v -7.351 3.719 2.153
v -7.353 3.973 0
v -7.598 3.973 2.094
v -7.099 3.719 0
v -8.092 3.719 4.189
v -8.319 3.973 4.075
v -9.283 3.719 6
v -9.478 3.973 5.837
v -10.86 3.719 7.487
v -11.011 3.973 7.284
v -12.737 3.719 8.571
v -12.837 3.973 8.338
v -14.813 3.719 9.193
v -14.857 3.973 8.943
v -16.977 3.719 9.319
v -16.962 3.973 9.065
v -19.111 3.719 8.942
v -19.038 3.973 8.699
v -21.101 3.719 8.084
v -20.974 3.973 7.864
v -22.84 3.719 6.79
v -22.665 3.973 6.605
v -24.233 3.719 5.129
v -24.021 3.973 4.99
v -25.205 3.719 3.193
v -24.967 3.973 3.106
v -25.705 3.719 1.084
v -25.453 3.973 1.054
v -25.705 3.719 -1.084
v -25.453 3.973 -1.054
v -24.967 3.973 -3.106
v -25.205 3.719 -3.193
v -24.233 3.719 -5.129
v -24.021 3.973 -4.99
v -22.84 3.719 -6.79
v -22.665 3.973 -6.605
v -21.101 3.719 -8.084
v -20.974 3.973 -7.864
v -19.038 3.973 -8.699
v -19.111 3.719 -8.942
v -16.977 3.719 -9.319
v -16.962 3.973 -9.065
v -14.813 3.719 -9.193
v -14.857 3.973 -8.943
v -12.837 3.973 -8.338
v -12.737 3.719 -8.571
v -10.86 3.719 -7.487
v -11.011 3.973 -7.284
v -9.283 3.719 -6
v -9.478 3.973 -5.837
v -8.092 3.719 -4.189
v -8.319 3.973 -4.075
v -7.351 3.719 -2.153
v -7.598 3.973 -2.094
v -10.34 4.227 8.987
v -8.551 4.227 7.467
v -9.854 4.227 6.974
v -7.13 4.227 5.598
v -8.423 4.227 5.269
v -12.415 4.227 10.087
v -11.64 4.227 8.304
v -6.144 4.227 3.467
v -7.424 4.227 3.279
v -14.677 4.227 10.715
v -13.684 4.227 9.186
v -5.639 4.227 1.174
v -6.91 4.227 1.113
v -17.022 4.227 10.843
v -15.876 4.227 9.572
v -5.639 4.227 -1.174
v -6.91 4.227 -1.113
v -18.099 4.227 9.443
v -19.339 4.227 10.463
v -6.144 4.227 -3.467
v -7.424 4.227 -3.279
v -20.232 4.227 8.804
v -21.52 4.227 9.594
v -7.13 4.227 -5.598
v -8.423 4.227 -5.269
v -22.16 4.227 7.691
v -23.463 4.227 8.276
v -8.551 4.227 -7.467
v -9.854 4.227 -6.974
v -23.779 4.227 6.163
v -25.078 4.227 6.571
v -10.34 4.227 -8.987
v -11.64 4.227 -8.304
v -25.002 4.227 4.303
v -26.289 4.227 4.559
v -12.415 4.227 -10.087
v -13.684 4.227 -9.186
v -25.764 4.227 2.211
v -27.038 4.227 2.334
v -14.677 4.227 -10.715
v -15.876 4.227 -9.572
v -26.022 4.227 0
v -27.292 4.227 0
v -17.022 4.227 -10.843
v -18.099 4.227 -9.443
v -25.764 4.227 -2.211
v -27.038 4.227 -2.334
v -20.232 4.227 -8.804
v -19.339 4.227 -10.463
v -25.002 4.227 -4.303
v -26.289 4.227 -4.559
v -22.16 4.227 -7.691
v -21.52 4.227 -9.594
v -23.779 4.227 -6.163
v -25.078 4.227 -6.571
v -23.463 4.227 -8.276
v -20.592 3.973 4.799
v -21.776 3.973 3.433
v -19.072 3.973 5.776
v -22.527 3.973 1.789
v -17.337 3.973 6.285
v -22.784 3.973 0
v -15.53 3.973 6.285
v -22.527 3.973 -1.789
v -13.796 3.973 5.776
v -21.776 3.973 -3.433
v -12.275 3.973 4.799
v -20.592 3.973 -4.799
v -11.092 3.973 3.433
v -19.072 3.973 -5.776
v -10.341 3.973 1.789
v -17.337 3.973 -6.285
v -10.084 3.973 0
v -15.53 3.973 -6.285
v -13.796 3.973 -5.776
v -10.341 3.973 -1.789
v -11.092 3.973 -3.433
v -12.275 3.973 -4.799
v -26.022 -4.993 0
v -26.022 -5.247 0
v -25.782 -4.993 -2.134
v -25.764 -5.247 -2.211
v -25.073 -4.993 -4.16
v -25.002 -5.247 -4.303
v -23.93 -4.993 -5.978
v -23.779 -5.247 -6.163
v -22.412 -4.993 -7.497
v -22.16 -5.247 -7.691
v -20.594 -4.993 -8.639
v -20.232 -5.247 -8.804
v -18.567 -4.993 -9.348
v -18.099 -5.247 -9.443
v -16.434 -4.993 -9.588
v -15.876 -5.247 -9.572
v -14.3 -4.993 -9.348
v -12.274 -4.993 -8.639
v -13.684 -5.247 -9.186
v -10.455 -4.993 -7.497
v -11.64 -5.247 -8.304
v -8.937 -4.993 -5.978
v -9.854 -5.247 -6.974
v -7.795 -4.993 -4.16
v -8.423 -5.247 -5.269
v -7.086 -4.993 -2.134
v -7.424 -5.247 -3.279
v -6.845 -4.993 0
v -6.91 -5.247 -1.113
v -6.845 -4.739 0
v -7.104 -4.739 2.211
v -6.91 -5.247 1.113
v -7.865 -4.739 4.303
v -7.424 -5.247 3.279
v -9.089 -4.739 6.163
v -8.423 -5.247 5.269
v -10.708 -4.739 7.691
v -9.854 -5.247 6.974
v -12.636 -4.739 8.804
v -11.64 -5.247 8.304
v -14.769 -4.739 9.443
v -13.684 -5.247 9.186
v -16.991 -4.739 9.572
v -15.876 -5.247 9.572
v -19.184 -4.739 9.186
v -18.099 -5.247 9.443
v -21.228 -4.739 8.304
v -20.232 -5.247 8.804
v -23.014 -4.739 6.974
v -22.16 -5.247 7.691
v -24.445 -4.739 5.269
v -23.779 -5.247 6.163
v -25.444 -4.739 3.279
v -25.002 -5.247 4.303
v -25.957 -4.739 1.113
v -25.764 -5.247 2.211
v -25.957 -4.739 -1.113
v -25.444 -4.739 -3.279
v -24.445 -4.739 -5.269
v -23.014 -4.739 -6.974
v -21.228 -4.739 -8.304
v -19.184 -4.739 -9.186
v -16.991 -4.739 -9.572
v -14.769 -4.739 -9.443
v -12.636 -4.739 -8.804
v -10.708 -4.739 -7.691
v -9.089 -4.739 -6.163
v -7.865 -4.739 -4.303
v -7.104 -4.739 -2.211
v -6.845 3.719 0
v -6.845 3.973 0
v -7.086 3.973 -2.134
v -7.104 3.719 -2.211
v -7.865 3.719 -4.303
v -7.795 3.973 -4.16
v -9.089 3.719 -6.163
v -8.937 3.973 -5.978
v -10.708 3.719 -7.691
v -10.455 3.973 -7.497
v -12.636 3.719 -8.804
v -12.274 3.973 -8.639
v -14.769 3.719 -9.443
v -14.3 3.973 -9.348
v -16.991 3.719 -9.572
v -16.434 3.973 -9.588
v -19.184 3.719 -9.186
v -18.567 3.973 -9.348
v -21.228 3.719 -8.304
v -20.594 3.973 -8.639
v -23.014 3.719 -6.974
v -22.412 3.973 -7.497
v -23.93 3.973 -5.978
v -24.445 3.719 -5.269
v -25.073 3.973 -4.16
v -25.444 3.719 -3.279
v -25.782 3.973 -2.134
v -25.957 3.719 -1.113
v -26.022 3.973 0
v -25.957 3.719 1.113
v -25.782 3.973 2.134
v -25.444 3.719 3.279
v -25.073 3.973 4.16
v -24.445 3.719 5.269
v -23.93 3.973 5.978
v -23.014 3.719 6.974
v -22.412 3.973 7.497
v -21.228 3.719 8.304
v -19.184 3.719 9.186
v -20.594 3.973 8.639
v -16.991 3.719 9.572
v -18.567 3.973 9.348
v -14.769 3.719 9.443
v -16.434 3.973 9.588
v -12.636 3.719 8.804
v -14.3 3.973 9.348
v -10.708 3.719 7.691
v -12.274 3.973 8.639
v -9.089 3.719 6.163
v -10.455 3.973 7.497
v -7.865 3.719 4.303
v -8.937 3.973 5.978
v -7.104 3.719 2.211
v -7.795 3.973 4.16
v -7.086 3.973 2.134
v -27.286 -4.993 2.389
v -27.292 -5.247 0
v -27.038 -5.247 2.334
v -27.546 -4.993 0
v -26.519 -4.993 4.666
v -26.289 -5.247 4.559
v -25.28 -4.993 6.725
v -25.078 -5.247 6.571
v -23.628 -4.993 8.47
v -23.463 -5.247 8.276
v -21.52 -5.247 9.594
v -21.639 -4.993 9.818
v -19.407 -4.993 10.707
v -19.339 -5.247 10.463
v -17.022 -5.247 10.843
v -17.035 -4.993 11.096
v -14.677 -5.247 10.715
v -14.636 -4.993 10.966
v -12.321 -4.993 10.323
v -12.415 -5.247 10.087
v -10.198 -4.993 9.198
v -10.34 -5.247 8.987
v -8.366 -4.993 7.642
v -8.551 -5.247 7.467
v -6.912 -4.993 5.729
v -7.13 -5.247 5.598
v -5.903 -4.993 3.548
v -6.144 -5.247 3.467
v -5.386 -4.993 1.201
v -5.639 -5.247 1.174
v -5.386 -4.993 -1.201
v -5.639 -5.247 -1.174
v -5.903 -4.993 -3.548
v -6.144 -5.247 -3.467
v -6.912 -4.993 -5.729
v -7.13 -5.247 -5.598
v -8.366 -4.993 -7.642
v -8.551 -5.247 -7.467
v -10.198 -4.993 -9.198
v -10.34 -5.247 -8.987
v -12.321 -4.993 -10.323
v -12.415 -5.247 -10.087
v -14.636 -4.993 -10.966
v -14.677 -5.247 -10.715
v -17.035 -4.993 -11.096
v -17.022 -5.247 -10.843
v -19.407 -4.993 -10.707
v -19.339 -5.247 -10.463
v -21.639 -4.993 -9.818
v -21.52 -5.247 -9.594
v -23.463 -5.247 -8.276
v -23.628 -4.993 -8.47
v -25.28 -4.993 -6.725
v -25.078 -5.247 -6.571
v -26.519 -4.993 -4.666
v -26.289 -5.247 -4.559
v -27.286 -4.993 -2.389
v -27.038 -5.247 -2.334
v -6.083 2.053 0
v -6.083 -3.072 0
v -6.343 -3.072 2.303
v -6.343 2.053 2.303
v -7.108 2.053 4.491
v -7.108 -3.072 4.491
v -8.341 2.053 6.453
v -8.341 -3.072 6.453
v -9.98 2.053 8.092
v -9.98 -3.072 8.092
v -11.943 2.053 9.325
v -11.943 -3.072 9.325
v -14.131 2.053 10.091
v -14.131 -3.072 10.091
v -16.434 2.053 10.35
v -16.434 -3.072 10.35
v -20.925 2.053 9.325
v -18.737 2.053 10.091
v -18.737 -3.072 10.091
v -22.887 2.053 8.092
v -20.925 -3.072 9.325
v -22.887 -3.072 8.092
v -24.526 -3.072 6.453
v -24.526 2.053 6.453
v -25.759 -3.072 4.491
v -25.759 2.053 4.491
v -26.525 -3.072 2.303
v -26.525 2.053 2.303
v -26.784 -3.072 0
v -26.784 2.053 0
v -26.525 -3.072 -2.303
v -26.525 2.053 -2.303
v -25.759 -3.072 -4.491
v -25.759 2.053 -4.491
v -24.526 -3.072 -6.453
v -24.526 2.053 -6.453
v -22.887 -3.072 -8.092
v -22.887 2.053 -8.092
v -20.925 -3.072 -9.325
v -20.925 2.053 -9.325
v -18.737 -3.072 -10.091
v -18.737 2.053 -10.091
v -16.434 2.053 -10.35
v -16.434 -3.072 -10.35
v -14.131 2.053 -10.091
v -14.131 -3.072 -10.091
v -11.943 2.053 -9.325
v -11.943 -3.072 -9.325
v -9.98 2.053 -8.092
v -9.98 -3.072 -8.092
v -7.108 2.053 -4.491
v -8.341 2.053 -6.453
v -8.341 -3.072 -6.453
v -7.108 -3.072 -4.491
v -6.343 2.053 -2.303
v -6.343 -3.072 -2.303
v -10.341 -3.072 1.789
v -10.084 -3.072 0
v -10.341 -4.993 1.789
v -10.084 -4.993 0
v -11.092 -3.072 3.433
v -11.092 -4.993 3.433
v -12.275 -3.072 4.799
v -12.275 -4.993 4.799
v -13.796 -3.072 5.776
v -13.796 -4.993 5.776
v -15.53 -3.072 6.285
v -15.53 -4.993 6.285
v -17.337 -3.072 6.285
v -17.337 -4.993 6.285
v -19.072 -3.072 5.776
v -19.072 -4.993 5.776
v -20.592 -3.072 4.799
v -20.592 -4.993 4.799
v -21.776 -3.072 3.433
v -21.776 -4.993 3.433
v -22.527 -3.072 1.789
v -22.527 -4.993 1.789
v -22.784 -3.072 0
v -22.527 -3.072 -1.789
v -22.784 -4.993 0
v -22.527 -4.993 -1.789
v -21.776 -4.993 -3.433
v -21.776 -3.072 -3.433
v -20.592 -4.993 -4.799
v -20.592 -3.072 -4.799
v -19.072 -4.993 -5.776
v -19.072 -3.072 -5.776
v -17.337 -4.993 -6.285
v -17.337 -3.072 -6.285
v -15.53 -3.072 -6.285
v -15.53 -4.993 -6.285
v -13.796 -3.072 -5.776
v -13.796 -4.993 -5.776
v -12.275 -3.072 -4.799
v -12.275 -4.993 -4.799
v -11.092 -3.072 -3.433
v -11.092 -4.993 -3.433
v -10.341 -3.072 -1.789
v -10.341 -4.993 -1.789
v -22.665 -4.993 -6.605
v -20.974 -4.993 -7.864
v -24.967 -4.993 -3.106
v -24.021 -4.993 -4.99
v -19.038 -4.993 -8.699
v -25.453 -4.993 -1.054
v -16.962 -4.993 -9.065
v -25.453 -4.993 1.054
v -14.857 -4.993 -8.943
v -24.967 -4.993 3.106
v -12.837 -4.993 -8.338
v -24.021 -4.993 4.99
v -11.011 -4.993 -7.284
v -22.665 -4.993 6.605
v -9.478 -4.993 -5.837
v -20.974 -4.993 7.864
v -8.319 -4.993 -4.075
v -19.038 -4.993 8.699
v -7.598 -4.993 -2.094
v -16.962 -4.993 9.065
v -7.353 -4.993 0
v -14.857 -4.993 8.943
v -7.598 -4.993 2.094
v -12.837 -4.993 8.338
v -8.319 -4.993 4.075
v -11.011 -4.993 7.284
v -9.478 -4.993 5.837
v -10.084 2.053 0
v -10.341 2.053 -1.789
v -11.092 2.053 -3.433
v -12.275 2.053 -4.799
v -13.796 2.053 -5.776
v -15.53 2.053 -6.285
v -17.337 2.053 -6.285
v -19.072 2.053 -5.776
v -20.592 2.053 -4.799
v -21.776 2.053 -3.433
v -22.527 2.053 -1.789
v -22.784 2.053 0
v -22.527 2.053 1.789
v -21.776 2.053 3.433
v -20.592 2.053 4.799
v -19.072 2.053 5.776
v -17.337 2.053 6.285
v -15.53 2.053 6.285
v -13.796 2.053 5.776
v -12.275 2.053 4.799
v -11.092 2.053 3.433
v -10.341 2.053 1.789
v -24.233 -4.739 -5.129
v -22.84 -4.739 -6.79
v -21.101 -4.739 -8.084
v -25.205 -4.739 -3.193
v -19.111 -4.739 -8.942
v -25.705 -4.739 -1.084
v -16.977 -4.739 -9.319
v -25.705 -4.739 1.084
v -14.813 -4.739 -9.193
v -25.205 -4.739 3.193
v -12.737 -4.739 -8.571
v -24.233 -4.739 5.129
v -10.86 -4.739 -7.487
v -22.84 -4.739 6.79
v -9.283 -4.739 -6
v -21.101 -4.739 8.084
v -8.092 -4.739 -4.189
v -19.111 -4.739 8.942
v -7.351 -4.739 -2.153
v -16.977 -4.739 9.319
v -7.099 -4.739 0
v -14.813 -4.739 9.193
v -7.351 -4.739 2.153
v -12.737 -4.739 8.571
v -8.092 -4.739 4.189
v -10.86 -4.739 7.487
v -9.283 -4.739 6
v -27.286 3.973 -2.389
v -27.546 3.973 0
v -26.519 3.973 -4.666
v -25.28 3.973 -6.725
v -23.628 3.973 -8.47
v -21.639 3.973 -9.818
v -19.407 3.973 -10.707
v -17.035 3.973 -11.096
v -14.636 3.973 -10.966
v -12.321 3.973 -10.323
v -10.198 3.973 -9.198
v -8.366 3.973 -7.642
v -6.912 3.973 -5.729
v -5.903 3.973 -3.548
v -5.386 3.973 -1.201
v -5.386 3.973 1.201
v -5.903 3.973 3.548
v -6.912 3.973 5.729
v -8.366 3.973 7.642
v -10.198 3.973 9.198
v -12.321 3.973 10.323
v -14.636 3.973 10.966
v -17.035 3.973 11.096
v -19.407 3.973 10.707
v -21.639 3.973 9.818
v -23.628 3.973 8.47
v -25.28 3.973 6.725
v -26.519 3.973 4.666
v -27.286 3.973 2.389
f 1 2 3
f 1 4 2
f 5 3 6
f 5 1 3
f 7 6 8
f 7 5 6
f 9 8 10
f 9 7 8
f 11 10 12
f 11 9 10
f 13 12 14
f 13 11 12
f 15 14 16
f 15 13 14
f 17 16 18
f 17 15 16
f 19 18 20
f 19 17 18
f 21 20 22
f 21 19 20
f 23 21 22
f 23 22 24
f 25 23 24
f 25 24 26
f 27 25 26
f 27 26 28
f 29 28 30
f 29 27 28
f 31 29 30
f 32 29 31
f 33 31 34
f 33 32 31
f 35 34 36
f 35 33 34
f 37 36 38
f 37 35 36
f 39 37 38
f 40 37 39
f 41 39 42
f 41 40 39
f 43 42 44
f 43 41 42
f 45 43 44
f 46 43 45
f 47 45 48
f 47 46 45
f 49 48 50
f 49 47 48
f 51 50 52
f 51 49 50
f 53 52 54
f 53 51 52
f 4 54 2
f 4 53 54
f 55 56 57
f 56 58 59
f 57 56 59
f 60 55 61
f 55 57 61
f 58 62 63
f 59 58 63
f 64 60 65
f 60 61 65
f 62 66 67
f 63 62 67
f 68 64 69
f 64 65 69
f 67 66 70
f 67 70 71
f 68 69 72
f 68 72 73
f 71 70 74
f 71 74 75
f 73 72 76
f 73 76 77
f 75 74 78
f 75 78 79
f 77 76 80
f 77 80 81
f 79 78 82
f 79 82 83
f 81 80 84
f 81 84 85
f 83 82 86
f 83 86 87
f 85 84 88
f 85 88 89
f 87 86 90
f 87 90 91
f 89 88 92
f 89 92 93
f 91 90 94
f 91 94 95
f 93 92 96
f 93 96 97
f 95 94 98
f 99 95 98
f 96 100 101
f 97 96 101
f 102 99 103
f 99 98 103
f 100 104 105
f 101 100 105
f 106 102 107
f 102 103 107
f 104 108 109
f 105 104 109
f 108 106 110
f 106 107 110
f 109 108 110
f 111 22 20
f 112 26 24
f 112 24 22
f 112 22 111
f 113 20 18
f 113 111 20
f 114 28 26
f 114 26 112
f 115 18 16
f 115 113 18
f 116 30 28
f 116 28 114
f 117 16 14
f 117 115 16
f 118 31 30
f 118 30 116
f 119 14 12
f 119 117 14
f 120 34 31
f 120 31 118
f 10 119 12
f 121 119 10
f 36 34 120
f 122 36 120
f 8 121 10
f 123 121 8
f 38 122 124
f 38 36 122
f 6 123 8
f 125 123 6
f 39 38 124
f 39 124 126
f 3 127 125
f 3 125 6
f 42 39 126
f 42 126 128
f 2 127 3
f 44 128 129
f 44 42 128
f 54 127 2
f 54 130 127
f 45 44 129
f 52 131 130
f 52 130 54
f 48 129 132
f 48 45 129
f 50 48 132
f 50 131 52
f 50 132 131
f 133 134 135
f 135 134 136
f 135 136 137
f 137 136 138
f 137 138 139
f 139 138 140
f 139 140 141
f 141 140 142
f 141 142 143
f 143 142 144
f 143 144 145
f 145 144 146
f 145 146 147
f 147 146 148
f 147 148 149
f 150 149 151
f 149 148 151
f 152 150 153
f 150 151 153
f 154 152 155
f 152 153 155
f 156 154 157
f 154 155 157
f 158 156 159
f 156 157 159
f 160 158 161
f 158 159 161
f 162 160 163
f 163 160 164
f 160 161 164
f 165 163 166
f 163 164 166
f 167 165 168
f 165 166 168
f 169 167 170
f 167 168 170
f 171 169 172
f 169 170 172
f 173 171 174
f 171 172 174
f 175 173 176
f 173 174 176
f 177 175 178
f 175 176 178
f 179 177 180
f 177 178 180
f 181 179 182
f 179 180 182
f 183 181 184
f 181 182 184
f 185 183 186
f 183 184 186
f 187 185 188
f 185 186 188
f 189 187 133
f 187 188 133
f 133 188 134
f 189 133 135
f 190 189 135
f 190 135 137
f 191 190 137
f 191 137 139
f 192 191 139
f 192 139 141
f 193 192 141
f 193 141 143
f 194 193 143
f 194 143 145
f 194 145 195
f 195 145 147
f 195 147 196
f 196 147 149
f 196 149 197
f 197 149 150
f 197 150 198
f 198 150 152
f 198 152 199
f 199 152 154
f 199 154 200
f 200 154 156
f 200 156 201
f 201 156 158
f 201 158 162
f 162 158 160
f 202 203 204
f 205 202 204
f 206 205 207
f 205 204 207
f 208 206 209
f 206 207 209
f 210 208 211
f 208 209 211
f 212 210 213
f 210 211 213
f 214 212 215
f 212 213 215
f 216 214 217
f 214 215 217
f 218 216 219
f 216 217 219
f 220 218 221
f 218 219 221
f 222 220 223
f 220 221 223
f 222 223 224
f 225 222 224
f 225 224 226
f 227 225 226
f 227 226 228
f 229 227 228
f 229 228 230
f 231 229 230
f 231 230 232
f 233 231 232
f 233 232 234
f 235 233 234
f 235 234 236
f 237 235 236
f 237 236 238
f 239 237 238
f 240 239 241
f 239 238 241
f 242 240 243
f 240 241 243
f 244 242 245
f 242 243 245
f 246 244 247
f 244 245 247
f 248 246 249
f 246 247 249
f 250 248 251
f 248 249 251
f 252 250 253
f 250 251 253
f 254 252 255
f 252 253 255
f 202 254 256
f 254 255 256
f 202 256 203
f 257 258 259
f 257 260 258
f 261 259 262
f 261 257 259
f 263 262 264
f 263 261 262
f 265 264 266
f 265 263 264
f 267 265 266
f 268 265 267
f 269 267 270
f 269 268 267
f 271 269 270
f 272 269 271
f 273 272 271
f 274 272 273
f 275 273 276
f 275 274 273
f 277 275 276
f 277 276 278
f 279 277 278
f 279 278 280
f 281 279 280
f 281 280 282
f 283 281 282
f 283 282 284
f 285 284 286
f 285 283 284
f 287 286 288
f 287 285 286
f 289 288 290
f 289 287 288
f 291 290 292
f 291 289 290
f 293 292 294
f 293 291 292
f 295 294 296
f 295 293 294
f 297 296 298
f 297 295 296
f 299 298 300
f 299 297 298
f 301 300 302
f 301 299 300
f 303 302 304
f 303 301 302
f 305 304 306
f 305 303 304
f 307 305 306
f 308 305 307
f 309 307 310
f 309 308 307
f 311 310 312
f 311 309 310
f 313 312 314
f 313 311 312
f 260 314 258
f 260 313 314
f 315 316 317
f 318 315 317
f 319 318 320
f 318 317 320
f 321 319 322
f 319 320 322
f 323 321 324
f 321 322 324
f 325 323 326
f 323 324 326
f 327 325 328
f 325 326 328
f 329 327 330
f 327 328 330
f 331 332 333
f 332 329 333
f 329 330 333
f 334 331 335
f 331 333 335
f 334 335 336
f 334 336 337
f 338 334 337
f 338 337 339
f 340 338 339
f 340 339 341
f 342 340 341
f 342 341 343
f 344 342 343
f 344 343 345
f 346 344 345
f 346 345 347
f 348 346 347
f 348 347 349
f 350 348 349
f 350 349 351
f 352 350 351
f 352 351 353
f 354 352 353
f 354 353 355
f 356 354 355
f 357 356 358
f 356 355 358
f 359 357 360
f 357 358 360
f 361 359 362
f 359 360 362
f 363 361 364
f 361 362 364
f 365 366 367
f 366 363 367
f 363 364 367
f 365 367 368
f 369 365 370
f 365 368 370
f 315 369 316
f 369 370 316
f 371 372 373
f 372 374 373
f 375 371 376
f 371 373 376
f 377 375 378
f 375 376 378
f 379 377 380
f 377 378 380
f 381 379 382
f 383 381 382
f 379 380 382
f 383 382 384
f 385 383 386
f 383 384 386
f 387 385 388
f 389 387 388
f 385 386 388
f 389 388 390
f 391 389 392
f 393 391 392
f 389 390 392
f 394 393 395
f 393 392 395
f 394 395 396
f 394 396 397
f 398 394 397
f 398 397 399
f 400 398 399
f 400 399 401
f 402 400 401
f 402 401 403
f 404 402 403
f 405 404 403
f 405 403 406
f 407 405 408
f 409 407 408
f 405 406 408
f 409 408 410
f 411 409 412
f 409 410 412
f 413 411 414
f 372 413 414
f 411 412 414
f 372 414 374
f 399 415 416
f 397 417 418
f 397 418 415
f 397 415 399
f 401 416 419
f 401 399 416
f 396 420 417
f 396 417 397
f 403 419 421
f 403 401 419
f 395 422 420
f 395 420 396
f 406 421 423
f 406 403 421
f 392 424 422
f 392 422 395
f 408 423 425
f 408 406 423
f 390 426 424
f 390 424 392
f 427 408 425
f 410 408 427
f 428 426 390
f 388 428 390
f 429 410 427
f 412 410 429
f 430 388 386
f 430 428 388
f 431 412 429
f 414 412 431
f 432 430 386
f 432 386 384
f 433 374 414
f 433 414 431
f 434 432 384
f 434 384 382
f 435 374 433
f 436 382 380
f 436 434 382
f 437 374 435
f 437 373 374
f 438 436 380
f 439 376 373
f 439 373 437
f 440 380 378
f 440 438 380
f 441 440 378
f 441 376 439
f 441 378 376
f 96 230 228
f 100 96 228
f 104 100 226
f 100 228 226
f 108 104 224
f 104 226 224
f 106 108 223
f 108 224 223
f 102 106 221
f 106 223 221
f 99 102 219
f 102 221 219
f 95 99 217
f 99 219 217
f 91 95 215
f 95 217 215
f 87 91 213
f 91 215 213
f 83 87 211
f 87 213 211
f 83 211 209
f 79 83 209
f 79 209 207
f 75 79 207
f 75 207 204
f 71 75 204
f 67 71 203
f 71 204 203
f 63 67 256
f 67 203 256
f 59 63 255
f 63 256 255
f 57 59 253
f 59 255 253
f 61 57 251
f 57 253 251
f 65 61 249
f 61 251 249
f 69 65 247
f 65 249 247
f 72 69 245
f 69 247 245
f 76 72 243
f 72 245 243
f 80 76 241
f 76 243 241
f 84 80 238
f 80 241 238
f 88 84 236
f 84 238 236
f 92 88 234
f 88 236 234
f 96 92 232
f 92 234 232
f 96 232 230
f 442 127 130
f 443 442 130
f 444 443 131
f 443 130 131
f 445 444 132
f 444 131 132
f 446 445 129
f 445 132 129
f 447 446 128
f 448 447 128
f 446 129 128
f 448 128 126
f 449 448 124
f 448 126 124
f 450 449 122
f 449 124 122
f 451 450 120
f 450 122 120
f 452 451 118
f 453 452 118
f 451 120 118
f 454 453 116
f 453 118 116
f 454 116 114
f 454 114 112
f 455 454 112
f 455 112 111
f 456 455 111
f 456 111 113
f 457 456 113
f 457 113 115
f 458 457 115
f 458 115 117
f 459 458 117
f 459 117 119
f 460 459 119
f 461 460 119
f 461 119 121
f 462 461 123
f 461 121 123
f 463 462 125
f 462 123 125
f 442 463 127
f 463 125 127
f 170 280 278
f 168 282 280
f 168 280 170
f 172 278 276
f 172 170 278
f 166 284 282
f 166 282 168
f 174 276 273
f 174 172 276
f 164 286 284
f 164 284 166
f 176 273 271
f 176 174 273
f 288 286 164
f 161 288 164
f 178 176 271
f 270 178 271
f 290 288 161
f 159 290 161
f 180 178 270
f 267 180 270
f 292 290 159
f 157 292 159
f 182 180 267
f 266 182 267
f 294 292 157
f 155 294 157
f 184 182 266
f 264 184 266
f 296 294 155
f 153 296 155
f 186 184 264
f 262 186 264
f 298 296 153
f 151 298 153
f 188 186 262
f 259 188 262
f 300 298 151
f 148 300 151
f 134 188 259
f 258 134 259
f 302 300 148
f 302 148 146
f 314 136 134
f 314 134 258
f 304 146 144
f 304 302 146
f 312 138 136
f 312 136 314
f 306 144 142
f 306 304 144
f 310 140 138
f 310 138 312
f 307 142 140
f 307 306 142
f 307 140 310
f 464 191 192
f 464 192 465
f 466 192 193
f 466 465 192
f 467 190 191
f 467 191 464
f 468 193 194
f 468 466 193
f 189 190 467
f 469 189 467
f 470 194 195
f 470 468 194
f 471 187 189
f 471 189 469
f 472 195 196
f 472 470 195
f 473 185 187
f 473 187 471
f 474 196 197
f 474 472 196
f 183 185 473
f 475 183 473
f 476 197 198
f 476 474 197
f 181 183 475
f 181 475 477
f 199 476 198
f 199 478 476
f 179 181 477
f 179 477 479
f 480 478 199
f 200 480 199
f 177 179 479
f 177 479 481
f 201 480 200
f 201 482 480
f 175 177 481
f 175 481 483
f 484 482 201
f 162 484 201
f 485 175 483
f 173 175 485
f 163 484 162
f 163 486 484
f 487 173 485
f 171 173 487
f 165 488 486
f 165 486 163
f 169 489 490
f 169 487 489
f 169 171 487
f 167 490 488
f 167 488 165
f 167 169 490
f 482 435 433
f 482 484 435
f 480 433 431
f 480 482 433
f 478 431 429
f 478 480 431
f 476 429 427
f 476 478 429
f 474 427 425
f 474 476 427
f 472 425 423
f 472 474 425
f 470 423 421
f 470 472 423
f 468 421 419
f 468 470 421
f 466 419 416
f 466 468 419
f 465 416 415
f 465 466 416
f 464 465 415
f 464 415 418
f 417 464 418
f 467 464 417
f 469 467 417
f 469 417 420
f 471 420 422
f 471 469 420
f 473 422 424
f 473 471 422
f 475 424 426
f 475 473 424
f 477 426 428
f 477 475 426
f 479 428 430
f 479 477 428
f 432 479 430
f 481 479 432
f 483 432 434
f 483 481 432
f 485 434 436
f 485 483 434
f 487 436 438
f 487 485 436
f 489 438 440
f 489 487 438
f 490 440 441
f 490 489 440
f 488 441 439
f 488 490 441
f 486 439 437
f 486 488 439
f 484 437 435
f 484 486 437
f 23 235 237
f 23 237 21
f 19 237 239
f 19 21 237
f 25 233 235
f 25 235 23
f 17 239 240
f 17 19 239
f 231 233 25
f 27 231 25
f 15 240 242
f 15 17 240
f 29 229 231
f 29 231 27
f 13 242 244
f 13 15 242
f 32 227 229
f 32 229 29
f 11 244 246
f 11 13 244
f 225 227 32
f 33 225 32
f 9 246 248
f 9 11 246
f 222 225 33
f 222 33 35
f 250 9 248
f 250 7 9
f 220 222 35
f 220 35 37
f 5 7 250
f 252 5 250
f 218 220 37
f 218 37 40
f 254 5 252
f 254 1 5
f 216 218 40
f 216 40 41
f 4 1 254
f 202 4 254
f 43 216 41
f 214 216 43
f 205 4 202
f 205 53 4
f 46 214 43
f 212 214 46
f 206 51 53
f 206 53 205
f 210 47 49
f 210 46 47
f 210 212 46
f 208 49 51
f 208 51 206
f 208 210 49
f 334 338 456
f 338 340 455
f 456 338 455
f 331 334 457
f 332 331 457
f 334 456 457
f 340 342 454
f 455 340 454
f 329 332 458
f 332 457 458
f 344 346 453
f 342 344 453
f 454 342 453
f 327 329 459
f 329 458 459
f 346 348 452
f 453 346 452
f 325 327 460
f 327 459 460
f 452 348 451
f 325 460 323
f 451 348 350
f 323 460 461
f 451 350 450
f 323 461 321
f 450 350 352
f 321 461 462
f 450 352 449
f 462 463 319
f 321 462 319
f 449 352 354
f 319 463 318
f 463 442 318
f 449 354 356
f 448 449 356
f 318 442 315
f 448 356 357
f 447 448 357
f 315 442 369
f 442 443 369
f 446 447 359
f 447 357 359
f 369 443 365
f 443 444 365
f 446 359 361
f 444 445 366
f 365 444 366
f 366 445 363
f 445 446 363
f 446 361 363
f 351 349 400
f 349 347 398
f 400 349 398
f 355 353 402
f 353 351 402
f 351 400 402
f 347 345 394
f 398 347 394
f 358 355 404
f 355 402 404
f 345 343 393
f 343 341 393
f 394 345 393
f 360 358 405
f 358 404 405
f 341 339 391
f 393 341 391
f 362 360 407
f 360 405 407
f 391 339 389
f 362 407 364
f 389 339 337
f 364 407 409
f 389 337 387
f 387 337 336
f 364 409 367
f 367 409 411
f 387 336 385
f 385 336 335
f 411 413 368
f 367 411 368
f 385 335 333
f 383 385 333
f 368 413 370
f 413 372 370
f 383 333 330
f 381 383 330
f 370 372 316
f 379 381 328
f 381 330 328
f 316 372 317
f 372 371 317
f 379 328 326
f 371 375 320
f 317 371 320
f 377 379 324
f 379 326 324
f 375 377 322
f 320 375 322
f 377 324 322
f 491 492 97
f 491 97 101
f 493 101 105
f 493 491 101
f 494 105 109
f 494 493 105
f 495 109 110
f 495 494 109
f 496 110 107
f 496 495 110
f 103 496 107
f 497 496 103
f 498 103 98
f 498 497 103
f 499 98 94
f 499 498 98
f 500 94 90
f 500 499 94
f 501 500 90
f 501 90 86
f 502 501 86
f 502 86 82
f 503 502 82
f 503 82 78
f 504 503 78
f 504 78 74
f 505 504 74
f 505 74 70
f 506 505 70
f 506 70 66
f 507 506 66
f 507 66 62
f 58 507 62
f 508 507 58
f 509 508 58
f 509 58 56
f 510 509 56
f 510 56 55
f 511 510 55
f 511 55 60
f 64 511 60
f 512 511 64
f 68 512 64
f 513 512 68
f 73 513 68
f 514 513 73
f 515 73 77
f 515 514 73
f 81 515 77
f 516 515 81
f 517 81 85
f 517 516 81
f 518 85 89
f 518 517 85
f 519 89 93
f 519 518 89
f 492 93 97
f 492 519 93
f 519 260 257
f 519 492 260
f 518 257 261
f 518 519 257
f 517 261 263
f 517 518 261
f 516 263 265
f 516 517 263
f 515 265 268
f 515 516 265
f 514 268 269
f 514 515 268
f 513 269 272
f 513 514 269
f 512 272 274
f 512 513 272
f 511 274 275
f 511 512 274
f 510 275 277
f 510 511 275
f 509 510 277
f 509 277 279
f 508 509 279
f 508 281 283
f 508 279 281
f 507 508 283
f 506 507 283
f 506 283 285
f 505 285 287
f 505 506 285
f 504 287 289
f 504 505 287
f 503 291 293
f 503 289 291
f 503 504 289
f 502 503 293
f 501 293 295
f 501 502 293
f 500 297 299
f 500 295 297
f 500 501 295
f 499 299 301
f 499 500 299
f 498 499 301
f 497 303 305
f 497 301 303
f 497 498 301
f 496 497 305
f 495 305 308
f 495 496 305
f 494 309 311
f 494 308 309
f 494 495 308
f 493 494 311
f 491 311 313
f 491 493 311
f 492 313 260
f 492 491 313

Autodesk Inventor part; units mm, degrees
sketch "Sketch1" plane through (0, 0, 0) normal (0, 0, 1) x (1, 0, 0)
  line L0 (-27.5463, 4.2273) -> (-26.0223, 4.2273)
  line L1 (-26.0223, 4.2273) -> (-26.0223, -5.2469)
  line L2 (-26.0223, -5.2469) -> (-27.5463, -5.2469)
  line L3 (-27.5463, -5.2469) -> (-27.5463, 4.2273)
  line L4 (-16.4338, 9.0278) -> (-16.4338, -15.3549)
  dimension "d0" = 9.4742
  dimension "d1" = 1.524
  dimension "d2" = 11.1125
revolve "Revolution1" add sketch "Sketch1" angle 360 about axis through (-16.4338, 9.0278, 0) along (0, -1, 0)
ref_plane "Work Plane1" through (-16.4338, 3.9733, 0) normal (0, 1, 0) x (1, 0, 0)
sketch "Sketch2" plane through (-16.4338, 3.9733, 0) normal (0, 1, 0) x (1, 0, 0)
  circle A0 centre (0, 0) radius 11.1125
  circle A1 centre (0, 0) radius 6.35
  dimension "d5" = 12.7
  dimension "d35" = 22.225
extrude "Extrusion1" add sketch "Sketch2" against normal blind 1.9207
ref_plane "Work Plane2" through (-16.4338, -4.9929, 0) normal (0, -1, 0) x (1, 0, 0)
sketch "Sketch3" plane through (-16.4338, -4.9929, 0) normal (0, -1, 0) x (1, 0, 0)
  circle A0 centre (0, 0) radius 11.1125
  circle A1 centre (0, 0) radius 6.35
  dimension "d9" = 12.7
  dimension "d34" = 22.225
extrude "Extrusion2" add sketch "Sketch3" against normal blind 1.9207
ref_plane "Work Plane3" through (-16.4338, -3.0722, 0) normal (0, 1, 0) x (1, 0, 0)
sketch "Sketch4" plane through (-16.4338, -3.0722, 0) normal (0, 1, 0) x (1, 0, 0)
  circle A0 centre (0, 0) radius 10.3505
  dimension "d13" = 20.701
extrude "Extrusion3" cut sketch "Sketch4" along normal blind 5.1248
sketch "Sketch5" plane through (-16.4338, -4.9929, 0) normal (0, -1, 0) x (1, 0, 0)
  circle A0 centre (0, 0) radius 9.5885 projected
  circle A1 centre (0, 0) radius 9.3345
  dimension "d16" = 0.254
extrude "Extrusion4" cut sketch "Sketch5" against normal blind 0.254
chamfer "Chamfer1" distance 0.254 angle 45 1 edges at (-25.7683, -4.9929, 0)
sketch "Sketch6" plane through (-16.4338, 3.9733, 0) normal (0, 1, 0) x (1, 0, 0)
  circle A0 centre (0, 0) radius 9.5885 projected
  circle A1 centre (0, 0) radius 9.3345
  dimension "d22" = 0.254
extrude "Extrusion5" cut sketch "Sketch6" against normal blind 0.254
chamfer "Chamfer2" distance 0.254 angle 45 1 edges at (-25.7683, 3.9733, 0)
chamfer "Chamfer3" distance 0.254 angle 45 1 edges at (-5.3213, -5.2469, 0)
chamfer "Chamfer4" distance 0.254 angle 45 1 edges at (-5.3213, 4.2273, 0)
properties part number "Outer Casing 1764"
